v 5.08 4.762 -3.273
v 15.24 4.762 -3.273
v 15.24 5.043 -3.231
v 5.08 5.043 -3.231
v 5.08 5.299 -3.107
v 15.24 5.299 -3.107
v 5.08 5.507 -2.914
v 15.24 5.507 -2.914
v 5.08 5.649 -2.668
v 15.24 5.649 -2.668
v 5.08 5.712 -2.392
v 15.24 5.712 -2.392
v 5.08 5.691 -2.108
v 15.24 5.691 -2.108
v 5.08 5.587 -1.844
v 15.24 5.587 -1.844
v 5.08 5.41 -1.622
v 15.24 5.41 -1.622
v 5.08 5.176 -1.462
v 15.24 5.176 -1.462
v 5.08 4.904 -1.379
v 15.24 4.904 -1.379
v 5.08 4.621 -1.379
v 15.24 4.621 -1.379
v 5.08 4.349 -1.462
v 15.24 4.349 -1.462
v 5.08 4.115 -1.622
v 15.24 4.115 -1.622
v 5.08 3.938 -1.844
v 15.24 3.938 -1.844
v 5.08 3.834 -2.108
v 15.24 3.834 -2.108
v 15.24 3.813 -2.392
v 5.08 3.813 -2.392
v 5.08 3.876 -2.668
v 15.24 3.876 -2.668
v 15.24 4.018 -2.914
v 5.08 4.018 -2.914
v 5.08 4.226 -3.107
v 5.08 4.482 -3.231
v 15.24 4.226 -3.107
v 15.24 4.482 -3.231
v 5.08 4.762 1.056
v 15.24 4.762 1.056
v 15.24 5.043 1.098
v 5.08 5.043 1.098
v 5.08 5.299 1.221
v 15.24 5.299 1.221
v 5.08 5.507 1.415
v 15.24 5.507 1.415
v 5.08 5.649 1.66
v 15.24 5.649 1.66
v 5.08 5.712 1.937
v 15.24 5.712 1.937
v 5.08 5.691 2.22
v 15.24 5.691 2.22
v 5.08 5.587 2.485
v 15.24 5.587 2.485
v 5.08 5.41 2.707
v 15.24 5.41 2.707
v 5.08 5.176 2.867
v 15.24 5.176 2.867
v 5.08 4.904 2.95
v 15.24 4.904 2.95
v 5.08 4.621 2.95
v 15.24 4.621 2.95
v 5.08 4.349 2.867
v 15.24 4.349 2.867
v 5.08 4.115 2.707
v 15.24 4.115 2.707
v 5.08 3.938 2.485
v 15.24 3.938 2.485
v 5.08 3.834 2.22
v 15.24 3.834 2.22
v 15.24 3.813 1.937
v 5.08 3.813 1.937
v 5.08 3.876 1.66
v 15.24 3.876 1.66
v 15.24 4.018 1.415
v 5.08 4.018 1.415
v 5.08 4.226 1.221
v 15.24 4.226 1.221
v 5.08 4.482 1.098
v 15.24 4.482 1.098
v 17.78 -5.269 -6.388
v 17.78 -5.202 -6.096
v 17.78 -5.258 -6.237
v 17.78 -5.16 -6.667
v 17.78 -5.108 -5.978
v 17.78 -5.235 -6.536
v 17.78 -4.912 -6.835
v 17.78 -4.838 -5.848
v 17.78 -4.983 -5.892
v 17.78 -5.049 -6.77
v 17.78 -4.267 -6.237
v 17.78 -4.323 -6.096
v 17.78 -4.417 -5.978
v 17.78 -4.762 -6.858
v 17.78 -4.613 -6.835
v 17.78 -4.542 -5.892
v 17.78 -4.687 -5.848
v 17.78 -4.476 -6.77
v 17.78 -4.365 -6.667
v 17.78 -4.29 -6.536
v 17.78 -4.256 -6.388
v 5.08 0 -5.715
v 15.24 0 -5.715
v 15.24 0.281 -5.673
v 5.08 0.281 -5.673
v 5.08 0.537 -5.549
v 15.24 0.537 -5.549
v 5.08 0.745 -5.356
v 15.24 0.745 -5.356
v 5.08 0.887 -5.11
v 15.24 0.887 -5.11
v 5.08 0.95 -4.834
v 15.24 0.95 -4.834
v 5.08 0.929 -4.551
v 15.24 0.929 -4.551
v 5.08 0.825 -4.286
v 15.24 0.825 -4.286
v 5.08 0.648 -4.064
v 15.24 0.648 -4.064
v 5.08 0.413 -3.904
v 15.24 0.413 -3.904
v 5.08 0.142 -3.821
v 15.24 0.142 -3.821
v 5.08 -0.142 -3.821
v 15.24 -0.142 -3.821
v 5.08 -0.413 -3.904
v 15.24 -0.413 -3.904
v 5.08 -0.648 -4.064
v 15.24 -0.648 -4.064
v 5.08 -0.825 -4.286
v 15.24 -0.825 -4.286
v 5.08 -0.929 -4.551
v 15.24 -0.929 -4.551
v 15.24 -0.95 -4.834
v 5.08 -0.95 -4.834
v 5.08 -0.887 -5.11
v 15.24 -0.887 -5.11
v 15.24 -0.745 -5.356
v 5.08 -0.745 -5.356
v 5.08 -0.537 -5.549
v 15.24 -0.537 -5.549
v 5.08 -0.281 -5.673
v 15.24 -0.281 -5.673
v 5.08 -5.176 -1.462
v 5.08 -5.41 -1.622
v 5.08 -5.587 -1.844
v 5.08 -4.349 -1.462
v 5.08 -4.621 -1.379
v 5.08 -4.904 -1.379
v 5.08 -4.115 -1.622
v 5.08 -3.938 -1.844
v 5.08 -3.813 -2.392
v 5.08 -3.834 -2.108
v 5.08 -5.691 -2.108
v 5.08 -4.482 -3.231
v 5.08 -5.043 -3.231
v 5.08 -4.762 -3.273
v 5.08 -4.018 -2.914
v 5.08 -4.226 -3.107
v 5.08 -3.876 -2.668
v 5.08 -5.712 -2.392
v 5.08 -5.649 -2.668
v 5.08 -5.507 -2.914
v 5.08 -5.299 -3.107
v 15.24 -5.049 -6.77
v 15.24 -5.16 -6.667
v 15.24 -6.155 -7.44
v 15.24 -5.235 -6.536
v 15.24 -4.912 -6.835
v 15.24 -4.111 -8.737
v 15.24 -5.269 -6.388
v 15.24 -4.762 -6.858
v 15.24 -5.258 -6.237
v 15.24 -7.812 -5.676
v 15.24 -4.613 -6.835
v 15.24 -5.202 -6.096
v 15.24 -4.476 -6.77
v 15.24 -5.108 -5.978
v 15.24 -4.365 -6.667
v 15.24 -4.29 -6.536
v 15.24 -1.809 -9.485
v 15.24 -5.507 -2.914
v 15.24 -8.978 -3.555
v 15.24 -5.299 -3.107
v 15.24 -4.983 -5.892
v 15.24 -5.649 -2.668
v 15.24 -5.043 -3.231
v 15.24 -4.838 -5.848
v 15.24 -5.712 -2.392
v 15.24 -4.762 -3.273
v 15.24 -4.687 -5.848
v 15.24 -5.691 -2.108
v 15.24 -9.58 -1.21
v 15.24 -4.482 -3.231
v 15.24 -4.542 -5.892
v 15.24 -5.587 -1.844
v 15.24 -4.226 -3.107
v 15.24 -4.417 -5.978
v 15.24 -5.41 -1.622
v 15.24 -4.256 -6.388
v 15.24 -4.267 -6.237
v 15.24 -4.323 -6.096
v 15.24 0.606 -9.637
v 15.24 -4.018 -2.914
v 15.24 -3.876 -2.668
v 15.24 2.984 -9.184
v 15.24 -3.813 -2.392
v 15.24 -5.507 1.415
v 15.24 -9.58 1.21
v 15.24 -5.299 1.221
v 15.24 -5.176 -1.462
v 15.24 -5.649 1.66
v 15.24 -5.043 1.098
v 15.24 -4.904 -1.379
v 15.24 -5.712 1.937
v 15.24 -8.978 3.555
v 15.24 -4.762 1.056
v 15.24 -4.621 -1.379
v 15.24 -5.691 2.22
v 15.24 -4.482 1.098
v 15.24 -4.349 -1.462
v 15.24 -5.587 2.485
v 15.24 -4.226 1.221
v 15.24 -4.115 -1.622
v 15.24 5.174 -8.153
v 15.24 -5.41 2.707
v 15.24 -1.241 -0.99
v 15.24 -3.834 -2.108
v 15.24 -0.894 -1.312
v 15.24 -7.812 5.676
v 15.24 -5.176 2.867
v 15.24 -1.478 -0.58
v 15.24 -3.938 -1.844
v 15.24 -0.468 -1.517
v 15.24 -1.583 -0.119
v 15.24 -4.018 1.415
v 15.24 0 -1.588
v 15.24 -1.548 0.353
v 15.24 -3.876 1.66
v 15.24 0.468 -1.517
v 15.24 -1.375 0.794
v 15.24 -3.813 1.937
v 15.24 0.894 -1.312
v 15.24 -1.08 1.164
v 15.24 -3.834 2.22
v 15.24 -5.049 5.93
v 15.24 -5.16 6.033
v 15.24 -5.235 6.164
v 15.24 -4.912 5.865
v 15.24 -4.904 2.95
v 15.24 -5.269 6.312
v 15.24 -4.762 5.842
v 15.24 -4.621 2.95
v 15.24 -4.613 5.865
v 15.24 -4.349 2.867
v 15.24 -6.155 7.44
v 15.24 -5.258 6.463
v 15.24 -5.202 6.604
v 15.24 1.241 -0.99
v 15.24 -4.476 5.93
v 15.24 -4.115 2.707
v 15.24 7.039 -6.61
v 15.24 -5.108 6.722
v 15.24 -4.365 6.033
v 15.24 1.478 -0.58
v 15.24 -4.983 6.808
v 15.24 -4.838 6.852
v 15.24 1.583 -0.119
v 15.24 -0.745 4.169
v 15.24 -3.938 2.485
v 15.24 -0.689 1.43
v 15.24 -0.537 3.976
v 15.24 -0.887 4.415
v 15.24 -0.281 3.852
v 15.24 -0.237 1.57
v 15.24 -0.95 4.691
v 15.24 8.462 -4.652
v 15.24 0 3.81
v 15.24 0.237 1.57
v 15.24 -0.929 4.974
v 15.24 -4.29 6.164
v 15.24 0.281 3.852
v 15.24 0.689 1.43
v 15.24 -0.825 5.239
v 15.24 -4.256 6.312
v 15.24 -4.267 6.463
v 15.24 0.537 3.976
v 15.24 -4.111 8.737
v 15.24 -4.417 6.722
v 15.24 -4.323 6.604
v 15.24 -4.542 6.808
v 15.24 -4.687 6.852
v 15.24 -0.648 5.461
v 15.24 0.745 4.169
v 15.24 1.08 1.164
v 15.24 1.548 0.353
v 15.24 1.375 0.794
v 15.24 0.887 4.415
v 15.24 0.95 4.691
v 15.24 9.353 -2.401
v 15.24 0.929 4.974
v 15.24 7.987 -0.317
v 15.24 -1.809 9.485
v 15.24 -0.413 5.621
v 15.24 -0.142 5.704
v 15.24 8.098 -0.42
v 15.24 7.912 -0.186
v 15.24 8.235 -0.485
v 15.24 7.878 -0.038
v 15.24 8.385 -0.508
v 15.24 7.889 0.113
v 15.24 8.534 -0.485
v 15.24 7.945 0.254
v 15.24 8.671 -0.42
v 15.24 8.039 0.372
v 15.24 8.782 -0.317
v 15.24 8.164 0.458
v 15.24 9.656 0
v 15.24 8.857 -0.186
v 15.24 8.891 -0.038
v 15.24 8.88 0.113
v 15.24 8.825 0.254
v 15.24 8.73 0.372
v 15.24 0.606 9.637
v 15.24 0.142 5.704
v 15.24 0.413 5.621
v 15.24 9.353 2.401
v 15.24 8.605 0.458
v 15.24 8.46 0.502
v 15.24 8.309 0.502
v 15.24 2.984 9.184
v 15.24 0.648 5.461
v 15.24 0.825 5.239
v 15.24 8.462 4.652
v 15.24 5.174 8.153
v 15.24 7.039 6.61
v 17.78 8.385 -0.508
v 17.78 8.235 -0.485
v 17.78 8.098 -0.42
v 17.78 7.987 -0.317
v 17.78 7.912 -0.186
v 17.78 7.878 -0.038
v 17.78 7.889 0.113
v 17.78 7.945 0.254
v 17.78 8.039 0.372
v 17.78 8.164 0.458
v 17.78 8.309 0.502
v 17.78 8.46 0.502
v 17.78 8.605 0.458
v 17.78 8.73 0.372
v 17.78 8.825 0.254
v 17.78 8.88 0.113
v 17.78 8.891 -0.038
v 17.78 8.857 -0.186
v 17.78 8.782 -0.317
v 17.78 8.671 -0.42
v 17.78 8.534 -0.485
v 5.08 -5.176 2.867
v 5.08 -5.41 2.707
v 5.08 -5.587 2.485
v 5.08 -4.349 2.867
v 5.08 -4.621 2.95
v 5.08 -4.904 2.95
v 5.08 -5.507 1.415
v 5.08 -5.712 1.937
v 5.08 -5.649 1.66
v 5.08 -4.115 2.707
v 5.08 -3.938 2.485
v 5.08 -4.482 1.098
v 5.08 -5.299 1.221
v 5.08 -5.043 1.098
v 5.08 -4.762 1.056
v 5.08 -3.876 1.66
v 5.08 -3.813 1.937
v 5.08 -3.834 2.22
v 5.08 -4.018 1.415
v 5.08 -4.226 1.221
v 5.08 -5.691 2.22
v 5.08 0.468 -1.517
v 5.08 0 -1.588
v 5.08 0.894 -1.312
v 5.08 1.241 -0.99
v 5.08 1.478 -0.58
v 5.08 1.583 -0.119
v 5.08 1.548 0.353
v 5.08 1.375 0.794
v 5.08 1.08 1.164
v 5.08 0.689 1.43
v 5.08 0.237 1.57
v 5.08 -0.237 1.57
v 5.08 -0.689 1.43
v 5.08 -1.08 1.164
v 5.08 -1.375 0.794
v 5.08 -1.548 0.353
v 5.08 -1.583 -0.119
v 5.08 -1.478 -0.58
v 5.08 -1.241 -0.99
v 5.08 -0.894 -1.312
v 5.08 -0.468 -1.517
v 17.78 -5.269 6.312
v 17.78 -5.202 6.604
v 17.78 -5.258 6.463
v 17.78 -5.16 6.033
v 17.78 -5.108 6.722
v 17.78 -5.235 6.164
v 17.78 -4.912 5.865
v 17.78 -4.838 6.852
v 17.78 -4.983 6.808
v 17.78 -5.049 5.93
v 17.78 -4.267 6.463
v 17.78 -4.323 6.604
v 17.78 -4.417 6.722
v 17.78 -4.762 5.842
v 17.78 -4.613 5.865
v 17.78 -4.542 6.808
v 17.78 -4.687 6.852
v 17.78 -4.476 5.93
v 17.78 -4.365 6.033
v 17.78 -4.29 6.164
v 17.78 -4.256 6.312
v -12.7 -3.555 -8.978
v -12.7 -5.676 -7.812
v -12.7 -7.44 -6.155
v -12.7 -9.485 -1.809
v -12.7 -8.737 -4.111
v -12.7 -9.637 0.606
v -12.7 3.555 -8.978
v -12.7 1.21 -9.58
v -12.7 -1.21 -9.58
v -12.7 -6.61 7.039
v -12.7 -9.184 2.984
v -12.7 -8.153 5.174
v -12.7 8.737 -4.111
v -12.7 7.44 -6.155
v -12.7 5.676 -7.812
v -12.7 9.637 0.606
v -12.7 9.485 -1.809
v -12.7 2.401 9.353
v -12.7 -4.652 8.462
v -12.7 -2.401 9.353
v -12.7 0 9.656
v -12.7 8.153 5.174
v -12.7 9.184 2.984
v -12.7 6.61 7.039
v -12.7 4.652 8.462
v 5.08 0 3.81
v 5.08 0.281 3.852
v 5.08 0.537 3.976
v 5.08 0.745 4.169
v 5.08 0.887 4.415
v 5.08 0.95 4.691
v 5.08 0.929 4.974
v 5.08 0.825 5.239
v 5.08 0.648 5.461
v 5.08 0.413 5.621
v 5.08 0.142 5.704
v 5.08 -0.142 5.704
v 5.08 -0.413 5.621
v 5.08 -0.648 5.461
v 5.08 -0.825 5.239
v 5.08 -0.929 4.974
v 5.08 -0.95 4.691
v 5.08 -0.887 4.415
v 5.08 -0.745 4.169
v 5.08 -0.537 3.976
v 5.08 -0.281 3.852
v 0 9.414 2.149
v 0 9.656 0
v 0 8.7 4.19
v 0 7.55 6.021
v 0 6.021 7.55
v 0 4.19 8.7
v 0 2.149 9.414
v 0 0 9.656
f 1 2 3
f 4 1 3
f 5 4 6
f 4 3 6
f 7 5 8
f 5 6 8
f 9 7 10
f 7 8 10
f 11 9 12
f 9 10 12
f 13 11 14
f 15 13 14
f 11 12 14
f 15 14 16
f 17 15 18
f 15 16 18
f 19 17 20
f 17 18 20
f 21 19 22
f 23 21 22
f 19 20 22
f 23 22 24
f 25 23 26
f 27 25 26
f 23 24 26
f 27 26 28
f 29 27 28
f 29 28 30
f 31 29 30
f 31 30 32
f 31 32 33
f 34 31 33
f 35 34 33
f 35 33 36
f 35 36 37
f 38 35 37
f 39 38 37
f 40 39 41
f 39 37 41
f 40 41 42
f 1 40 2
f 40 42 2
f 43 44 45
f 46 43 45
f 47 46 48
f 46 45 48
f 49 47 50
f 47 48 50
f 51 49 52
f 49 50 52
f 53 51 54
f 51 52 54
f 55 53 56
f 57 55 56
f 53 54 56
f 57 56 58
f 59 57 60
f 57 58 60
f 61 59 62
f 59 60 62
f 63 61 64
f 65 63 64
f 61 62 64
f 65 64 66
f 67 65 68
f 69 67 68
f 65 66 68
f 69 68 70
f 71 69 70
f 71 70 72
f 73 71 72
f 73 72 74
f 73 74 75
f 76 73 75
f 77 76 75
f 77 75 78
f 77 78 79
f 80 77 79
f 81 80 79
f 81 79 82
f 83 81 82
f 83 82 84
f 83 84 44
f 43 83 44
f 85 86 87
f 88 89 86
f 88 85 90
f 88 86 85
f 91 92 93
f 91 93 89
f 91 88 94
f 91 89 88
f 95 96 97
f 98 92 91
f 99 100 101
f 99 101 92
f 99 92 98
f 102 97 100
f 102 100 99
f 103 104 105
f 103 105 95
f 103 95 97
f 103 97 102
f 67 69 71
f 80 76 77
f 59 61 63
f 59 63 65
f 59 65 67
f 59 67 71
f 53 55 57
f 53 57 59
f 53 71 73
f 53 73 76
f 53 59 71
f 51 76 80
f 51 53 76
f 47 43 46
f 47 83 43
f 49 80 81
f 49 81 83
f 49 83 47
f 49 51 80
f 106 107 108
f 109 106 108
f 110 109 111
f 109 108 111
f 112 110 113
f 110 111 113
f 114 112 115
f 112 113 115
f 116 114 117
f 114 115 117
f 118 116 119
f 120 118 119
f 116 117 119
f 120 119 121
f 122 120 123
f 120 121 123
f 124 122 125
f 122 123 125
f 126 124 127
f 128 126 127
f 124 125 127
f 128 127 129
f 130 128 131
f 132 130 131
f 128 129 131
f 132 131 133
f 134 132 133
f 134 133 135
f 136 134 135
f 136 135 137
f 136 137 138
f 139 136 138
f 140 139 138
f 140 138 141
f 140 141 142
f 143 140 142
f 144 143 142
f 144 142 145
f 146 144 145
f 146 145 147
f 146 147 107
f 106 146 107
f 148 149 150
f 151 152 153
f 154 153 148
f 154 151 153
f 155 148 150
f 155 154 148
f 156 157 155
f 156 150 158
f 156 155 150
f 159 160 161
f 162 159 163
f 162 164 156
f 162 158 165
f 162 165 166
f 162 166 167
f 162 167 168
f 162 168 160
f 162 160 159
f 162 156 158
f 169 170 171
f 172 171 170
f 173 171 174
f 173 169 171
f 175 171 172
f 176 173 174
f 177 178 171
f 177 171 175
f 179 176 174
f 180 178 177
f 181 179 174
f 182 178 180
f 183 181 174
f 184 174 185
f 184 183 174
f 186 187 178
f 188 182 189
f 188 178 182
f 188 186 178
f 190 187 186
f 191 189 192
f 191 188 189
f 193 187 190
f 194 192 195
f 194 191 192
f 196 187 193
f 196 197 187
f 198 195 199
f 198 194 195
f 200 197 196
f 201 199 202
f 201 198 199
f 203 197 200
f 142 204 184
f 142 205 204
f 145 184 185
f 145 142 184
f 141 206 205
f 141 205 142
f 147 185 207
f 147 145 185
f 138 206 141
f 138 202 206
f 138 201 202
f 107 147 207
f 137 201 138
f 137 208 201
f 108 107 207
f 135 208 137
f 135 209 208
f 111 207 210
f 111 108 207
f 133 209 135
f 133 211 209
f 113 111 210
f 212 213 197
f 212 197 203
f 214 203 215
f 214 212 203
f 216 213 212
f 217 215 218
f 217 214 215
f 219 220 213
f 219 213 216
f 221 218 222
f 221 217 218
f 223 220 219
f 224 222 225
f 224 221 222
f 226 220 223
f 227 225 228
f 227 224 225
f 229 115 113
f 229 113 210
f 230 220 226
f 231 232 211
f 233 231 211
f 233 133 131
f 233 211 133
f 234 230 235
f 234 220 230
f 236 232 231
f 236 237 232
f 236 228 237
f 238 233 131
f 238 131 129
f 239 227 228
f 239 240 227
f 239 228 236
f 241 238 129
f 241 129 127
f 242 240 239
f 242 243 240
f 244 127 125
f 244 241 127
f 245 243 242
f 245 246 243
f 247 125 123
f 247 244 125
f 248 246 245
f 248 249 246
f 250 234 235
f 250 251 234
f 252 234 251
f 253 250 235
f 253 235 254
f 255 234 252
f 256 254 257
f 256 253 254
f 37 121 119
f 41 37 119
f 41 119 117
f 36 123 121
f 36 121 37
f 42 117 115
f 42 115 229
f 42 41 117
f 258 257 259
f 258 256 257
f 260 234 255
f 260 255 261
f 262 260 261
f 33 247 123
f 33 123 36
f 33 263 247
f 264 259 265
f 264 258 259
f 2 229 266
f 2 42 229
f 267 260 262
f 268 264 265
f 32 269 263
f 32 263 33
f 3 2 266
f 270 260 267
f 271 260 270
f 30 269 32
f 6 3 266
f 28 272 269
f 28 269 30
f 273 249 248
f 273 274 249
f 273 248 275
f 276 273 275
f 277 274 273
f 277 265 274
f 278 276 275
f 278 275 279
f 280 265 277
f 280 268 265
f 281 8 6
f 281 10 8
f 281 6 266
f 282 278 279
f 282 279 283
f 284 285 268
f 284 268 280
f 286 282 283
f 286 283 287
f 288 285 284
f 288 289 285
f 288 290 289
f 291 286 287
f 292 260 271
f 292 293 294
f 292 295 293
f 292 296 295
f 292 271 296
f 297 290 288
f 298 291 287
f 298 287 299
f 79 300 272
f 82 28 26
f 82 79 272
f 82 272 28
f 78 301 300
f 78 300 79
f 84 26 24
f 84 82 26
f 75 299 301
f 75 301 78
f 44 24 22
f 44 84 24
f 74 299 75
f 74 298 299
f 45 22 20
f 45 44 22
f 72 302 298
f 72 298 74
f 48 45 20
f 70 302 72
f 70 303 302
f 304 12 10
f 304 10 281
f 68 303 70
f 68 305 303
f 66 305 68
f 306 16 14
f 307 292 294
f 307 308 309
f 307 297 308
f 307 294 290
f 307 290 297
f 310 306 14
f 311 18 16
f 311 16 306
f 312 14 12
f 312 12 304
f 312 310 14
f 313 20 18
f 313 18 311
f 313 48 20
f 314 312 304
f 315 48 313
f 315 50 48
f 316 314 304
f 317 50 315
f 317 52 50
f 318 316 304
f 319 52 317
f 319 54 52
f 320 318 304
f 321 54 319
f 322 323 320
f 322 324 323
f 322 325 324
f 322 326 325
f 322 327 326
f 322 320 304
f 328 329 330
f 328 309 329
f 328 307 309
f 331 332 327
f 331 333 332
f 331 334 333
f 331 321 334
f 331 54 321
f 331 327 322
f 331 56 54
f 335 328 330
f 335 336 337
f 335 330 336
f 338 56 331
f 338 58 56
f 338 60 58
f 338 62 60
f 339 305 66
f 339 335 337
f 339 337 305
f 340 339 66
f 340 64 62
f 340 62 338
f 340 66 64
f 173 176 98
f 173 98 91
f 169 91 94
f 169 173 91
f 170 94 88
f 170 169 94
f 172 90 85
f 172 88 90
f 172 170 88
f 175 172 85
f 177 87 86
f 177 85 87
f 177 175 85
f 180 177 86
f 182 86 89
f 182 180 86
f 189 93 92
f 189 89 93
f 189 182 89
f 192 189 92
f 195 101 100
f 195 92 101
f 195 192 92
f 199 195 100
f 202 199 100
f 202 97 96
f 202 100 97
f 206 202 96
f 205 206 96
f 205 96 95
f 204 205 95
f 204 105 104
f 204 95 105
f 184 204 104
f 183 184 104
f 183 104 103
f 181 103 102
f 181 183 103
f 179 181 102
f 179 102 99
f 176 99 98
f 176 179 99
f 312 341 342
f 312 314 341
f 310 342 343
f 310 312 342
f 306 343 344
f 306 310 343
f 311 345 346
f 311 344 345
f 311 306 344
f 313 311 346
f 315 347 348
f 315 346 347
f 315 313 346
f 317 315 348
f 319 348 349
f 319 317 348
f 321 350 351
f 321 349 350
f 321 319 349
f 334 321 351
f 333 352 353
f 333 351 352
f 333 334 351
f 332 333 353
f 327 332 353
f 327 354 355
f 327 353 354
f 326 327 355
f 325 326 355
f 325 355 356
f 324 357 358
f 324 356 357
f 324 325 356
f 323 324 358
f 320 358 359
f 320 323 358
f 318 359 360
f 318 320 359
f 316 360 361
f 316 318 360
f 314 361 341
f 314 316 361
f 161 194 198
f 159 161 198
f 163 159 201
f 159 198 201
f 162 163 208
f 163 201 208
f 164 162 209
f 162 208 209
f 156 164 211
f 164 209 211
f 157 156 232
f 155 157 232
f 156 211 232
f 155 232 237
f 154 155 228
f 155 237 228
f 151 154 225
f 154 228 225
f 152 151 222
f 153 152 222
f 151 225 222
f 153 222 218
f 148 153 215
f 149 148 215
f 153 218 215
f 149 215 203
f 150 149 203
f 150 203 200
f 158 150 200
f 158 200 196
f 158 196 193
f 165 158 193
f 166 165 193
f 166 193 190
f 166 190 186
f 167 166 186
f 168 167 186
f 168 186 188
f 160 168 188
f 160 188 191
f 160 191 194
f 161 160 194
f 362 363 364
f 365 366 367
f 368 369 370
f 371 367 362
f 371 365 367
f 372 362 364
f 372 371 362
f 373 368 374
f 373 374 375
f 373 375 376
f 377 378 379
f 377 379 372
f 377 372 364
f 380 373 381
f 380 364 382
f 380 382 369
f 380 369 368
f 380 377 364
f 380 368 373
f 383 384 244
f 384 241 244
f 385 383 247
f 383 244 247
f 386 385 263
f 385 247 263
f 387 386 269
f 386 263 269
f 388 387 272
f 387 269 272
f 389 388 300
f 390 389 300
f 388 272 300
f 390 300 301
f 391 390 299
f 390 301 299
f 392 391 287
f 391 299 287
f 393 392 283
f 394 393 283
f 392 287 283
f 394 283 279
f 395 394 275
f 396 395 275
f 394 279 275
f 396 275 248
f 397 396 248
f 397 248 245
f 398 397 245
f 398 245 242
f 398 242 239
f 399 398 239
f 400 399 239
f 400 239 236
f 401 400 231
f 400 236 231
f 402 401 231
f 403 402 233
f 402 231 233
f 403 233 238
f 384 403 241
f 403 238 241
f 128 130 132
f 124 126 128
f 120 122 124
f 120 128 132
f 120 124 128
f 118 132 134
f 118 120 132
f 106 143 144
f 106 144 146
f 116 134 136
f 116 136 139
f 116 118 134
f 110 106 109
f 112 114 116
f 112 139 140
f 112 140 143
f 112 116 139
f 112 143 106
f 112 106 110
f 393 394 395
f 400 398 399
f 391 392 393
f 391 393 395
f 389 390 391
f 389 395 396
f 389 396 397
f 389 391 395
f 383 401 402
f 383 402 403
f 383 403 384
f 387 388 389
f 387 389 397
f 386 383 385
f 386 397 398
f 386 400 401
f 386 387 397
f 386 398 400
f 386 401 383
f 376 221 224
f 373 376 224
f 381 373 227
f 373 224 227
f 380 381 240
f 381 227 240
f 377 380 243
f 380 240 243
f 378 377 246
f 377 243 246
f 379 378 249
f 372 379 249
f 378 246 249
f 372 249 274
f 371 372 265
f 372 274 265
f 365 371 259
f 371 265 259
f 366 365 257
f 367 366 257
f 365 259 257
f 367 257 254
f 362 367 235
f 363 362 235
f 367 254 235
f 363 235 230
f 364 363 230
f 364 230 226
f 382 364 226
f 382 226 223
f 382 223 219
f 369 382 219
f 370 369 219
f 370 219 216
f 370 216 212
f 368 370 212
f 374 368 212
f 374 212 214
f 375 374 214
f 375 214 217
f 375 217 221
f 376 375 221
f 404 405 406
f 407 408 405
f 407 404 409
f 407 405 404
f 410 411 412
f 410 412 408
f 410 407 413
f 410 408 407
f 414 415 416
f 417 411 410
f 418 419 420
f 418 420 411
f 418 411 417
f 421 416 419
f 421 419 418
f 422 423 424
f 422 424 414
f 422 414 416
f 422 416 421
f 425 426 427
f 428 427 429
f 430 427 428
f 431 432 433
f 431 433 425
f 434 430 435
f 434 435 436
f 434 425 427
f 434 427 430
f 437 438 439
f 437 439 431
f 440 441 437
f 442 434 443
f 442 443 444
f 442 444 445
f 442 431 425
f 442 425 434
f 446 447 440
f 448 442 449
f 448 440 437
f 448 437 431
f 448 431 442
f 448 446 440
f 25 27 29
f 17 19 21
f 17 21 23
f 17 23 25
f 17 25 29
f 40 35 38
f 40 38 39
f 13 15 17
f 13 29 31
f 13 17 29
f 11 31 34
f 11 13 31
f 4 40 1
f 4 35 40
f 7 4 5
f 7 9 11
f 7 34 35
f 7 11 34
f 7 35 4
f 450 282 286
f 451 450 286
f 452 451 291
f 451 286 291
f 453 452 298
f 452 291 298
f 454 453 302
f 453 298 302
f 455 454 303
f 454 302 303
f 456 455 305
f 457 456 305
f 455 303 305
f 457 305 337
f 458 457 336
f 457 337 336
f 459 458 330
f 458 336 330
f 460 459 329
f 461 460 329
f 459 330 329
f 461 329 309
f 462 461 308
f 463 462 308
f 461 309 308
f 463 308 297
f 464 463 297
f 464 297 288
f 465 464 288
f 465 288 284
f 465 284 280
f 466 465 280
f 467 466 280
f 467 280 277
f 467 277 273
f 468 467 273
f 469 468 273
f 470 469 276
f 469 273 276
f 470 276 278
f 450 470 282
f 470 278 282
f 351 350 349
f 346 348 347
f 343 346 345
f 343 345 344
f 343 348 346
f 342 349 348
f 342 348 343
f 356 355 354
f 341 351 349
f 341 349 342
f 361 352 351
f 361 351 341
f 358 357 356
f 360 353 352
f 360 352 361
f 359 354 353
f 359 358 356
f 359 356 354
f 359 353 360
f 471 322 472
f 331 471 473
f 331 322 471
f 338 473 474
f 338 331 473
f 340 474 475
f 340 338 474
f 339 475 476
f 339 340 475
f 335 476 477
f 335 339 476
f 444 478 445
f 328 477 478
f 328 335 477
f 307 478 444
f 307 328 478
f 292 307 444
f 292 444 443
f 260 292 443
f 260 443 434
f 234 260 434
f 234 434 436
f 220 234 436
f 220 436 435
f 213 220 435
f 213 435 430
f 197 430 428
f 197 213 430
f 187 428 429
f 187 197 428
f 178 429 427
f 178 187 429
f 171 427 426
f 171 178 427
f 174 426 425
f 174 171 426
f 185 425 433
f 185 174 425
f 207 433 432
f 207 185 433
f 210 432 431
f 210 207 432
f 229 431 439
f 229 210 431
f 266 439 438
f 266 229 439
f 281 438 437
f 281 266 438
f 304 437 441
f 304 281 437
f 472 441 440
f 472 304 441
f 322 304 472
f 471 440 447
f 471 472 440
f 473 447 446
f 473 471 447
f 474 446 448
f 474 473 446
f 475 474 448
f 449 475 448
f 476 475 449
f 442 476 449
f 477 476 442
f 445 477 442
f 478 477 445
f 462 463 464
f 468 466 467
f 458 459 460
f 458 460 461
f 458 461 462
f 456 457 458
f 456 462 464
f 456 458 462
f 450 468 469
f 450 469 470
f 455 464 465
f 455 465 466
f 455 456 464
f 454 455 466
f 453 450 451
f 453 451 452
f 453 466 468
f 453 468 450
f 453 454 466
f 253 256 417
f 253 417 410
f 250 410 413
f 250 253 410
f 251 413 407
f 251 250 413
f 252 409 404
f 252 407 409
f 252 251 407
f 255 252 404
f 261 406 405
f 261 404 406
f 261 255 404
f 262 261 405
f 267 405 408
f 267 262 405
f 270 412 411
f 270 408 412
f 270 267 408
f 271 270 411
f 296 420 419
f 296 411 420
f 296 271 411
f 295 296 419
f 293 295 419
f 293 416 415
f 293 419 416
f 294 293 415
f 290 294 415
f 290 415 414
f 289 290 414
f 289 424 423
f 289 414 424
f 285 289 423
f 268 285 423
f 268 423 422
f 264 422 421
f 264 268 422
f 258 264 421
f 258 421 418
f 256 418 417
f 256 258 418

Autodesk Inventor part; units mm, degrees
ref_plane "YZ Plane" through (0, 0, 0) normal (1, 0, 0) x (0, 1, 0)
ref_plane "XZ Plane" through (0, 0, 0) normal (0, 1, 0) x (-1, 0, 0)
ref_plane "XY Plane" through (0, 0, 0) normal (0, 0, 1) x (1, 0, 0)
sketch "Sketch1" plane through (0, 0, 0) normal (1, 0, 0) x (0, 1, 0)
  circle A0 centre (0, 0) radius 9.6564
extrude "Extrusion1" add sketch "Sketch1" along normal blind 15.24
sketch "Sketch2" plane through (15.24, 0, 0) normal (1, 0, 0) x (0, 0, -1)
  circle A0 centre (0, 0) radius 6.5454
  circle A1 centre (0, 0) radius 1.5875
  circle A2 centre (-4.7625, 0) radius 0.9525
  circle A3 centre (2.3204, 4.7625) radius 0.9525
  circle A4 centre (4.7625, 0) radius 0.9525
  circle A5 centre (2.3204, -4.7625) radius 0.9525
  circle A6 centre (-2.0084, -4.7625) radius 0.9525
  circle A7 centre (-2.0084, 4.7625) radius 0.9525
  circle A8 centre (0, 8.2286) radius 0.508
  circle A9 centre (-5.715, -5.715) radius 0.508
  circle A10 centre (5.715, -5.715) radius 0.508
  dimension "d3" = 1.905
  dimension "d5" = 1.905
  dimension "d6" = 1.905
  dimension "d7" = 1.905
  dimension "d8" = 1.905
  dimension "d9" = 1.905
  dimension "d10" = 1.016
  dimension "d11" = 1.016
  dimension "d12" = 1.016
extrude "Extrusion2" cut sketch "Sketch2" against normal blind 10.16 contours A1 | A2 | A3 | A4 | A5 | A6 | A7
sketch "Sketch3" plane through (15.24, 0, 0) normal (1, 0, 0) x (0, 0, -1)
  circle A0 centre (0, 8.3846) radius 0.508
  circle A1 centre (-6.35, -4.7625) radius 0.508
  circle A2 centre (6.35, -4.7625) radius 0.508
  point P0 (0, 0)
  dimension "d15" = 1.016
  dimension "d16" = 1.016
  dimension "d17" = 1.016
extrude "Extrusion3" add sketch "Sketch3" along normal blind 2.54
sketch "Sketch4" plane through (0, 0, 0) normal (-1, 0, 0) x (0, 0, 1)
  circle A0 centre (0, 0) radius 9.6564
extrude "Extrusion4" add sketch "Sketch4" along normal blind 12.7
properties part number "DC SUBMERSIBLE PUMP"
